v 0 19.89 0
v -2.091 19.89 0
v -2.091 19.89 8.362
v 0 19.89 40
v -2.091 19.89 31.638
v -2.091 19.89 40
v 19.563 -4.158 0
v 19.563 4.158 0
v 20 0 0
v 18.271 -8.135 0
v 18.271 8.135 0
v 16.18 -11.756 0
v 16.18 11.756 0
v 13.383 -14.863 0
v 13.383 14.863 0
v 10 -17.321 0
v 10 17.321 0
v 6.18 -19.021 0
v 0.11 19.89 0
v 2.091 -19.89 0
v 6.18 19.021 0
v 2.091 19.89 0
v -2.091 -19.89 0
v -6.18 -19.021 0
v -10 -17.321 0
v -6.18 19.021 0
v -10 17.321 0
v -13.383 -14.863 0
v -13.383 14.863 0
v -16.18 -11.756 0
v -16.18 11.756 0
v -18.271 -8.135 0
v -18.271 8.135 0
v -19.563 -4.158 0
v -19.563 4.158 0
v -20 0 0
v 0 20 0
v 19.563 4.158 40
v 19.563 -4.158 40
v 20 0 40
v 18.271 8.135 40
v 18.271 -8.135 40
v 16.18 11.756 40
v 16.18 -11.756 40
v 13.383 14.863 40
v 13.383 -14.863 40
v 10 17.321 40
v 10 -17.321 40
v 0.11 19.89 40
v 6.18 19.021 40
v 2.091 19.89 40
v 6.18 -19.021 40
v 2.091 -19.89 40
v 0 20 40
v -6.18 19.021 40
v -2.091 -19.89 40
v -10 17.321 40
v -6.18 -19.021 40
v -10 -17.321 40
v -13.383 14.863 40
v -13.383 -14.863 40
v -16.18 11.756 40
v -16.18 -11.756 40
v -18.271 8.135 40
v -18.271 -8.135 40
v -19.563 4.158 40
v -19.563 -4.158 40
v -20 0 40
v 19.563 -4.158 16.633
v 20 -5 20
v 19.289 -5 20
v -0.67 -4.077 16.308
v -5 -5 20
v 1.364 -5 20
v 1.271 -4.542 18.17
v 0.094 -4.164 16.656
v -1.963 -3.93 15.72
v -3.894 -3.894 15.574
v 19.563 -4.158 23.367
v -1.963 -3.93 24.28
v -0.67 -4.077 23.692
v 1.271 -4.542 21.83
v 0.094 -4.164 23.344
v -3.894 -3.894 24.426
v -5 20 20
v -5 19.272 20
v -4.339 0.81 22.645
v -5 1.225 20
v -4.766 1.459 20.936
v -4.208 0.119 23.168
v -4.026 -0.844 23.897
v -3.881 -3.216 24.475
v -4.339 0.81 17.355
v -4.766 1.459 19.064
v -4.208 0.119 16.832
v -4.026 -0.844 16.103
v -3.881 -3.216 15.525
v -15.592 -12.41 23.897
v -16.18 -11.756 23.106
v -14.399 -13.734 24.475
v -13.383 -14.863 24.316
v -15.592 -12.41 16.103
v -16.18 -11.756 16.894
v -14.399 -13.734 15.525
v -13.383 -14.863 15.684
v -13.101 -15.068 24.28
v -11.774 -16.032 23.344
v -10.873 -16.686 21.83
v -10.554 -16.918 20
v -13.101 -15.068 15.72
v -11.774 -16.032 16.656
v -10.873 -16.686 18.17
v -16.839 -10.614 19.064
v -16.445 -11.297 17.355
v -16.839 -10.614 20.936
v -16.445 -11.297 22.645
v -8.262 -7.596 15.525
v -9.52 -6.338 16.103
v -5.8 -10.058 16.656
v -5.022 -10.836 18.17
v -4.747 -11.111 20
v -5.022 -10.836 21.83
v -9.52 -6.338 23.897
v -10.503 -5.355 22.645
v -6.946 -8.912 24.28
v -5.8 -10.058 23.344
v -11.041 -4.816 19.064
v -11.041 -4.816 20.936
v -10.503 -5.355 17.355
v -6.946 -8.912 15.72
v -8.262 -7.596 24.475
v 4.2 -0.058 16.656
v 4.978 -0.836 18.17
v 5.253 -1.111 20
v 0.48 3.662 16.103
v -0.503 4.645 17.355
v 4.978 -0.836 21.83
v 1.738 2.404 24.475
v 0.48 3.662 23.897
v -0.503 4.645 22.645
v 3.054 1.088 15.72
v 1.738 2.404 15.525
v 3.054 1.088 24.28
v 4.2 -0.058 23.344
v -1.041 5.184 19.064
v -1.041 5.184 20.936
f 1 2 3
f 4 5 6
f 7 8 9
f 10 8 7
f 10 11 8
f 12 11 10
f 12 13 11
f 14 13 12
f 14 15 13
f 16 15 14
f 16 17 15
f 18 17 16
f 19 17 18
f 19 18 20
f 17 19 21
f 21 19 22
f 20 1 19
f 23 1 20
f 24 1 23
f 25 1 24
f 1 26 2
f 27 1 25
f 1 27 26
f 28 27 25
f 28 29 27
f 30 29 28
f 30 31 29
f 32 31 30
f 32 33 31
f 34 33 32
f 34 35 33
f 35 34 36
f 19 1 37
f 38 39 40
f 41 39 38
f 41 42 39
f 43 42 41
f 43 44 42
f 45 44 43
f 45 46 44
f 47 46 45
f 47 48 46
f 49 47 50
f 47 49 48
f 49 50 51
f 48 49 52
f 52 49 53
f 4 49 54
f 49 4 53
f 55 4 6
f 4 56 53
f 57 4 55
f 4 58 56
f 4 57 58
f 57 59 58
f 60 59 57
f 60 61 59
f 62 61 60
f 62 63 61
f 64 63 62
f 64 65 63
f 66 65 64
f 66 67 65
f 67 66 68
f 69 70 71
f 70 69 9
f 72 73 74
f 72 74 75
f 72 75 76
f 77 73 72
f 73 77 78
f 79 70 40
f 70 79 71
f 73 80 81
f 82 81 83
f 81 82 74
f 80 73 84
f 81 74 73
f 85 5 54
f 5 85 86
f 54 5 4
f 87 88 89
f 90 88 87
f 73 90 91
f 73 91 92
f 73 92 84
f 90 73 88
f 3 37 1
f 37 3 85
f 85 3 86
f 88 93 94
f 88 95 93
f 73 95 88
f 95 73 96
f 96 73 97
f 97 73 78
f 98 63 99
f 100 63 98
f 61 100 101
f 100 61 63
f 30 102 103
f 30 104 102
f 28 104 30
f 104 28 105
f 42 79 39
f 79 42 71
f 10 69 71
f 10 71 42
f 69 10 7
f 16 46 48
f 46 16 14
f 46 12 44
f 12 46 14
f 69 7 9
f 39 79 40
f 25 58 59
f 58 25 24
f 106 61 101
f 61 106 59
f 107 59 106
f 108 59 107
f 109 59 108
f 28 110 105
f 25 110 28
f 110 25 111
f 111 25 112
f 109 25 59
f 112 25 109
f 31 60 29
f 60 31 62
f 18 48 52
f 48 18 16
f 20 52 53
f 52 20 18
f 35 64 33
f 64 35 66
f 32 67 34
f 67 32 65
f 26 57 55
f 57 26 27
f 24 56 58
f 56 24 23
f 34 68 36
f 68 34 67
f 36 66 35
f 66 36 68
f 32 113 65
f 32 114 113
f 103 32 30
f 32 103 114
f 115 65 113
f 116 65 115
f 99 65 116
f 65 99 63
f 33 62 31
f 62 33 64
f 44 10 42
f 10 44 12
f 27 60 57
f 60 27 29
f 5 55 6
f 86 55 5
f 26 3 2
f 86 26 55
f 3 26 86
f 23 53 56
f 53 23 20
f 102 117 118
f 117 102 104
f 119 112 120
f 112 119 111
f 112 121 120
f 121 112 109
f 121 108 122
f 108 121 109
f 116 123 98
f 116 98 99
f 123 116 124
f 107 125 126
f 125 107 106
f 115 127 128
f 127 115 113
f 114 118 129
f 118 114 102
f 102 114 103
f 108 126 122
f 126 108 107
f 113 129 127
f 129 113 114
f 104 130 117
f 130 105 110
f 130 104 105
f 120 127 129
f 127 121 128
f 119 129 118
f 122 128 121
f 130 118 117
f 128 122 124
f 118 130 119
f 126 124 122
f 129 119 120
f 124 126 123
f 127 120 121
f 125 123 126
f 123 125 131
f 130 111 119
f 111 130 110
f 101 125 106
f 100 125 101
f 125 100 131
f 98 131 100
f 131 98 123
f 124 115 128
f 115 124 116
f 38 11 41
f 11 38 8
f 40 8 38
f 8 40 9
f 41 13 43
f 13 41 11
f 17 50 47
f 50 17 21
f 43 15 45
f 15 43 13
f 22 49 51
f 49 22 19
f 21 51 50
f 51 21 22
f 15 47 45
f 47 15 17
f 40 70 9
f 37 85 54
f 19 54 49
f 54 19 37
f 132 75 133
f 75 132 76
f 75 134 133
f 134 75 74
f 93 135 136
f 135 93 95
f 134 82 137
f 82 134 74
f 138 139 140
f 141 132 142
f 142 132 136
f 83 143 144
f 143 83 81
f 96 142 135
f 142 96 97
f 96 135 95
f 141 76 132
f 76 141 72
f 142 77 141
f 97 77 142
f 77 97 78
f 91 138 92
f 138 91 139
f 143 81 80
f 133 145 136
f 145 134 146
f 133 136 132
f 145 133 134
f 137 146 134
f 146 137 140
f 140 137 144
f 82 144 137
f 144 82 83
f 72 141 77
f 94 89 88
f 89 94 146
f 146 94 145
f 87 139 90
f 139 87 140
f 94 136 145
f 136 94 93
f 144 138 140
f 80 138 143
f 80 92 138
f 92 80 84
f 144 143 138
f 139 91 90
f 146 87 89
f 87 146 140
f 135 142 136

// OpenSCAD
translate([0.0,0.0,0.0])  scale([1.0,1.0,1.0])  difference()  {
cylinder(r=20.0,h=40.0);
union()  {
intersection()  {
cylinder(r=20.0,h=40.0);
cube([20.0,20.0,40.0]);
}
polyhedron(
points = [[0.0,0.0,0.0],[20.0,0.0,0.0],[0.0,20.0,0.0],[-5.0,-5.0,20.0],[20.0,-5.0,20.0],[0.0,0.0,40.0],[20.0,0.0,40.0],[0.0,20.0,40.0],[-5.0,20.0,20.0]],
faces = [[0,1,2],[0,3,4,1],[3,5,6,4],[5,7,6],[7,5,3,8],[8,3,0,2],[4,6,1],[7,8,2],[6,7,2,1]]
);
}
translate([-15.0,-15.0,20.0])  rotate([-90.0,0.0,-45.0])  cylinder(r=4.5,h=10.0);
}
translate([0.0,0.0,0.0])  scale([1.0,1.0,1.0])  difference()  {
union()  {
intersection()  {
cylinder(r=20.0,h=40.0);
cube([20.0,20.0,40.0]);
}
polyhedron(
points = [[0.0,0.0,0.0],[20.0,0.0,0.0],[0.0,20.0,0.0],[-5.0,-5.0,20.0],[20.0,-5.0,20.0],[0.0,0.0,40.0],[20.0,0.0,40.0],[0.0,20.0,40.0],[-5.0,20.0,20.0]],
faces = [[0,1,2],[0,3,4,1],[3,5,6,4],[5,7,6],[7,5,3,8],[8,3,0,2],[4,6,1],[7,8,2],[6,7,2,1]]
);
}
translate([-5.0,-5.0,20.0])  rotate([-90.0,0.0,-45.0])  cylinder(r=4.5,h=10.0);
}
